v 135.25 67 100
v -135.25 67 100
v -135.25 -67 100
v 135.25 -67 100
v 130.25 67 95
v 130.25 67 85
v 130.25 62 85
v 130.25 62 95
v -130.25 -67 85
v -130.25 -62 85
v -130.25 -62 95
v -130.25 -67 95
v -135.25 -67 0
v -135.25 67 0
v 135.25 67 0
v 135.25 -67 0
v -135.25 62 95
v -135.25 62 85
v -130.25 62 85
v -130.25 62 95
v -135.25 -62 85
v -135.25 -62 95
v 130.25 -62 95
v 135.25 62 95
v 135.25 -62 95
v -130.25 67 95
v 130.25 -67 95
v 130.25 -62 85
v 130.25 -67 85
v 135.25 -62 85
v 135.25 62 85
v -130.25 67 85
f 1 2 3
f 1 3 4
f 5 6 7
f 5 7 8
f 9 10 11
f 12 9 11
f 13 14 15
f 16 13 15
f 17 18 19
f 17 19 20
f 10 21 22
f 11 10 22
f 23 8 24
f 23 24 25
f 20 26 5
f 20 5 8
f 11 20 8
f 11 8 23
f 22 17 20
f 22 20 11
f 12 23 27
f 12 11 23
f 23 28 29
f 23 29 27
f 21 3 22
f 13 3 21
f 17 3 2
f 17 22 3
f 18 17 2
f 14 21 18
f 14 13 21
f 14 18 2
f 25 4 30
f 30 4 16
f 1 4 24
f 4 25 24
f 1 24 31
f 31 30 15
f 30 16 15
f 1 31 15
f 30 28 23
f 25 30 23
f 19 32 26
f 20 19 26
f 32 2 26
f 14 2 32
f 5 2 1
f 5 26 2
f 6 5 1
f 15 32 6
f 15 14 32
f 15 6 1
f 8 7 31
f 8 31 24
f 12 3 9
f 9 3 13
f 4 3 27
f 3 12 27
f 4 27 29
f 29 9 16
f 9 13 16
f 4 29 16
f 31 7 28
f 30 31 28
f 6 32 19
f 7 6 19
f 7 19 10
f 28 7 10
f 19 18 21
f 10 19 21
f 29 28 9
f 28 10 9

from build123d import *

# Parameters (mm, degrees)
F0_W     = 270.5
F0_H     = 134
F1_DEPTH = 100
F2_W     = 124
F2_H     = 10
F3_DEPTH = 270.501
F4_W     = 260.5
F4_H     = 10
F5_DEPTH = 134.001


with BuildPart() as f1:
    # F0 (on Top) → F1 (new body)
    with BuildSketch(Plane.XY):
        Rectangle(F0_W, F0_H)
    extrude(amount=F1_DEPTH)

    # F2 (on face) → F3 (cut, through all)
    with BuildSketch(Plane(origin=(-135.25, 0, 0), x_dir=(0, -1, 0), z_dir=(-1, 0, 0))):
        with Locations((0, 90)):
            Rectangle(F2_W, F2_H)
    extrude(amount=-F3_DEPTH, mode=Mode.SUBTRACT)

    # F4 (on face) → F5 (cut, through all)
    with BuildSketch(Plane(origin=(0, 67, 0), x_dir=(-1, 0, 0), z_dir=(0, 1, 0))):
        with Locations((0, 90)):
            Rectangle(F4_W, F4_H)
    extrude(amount=-F5_DEPTH, mode=Mode.SUBTRACT)


solid = f1.part
